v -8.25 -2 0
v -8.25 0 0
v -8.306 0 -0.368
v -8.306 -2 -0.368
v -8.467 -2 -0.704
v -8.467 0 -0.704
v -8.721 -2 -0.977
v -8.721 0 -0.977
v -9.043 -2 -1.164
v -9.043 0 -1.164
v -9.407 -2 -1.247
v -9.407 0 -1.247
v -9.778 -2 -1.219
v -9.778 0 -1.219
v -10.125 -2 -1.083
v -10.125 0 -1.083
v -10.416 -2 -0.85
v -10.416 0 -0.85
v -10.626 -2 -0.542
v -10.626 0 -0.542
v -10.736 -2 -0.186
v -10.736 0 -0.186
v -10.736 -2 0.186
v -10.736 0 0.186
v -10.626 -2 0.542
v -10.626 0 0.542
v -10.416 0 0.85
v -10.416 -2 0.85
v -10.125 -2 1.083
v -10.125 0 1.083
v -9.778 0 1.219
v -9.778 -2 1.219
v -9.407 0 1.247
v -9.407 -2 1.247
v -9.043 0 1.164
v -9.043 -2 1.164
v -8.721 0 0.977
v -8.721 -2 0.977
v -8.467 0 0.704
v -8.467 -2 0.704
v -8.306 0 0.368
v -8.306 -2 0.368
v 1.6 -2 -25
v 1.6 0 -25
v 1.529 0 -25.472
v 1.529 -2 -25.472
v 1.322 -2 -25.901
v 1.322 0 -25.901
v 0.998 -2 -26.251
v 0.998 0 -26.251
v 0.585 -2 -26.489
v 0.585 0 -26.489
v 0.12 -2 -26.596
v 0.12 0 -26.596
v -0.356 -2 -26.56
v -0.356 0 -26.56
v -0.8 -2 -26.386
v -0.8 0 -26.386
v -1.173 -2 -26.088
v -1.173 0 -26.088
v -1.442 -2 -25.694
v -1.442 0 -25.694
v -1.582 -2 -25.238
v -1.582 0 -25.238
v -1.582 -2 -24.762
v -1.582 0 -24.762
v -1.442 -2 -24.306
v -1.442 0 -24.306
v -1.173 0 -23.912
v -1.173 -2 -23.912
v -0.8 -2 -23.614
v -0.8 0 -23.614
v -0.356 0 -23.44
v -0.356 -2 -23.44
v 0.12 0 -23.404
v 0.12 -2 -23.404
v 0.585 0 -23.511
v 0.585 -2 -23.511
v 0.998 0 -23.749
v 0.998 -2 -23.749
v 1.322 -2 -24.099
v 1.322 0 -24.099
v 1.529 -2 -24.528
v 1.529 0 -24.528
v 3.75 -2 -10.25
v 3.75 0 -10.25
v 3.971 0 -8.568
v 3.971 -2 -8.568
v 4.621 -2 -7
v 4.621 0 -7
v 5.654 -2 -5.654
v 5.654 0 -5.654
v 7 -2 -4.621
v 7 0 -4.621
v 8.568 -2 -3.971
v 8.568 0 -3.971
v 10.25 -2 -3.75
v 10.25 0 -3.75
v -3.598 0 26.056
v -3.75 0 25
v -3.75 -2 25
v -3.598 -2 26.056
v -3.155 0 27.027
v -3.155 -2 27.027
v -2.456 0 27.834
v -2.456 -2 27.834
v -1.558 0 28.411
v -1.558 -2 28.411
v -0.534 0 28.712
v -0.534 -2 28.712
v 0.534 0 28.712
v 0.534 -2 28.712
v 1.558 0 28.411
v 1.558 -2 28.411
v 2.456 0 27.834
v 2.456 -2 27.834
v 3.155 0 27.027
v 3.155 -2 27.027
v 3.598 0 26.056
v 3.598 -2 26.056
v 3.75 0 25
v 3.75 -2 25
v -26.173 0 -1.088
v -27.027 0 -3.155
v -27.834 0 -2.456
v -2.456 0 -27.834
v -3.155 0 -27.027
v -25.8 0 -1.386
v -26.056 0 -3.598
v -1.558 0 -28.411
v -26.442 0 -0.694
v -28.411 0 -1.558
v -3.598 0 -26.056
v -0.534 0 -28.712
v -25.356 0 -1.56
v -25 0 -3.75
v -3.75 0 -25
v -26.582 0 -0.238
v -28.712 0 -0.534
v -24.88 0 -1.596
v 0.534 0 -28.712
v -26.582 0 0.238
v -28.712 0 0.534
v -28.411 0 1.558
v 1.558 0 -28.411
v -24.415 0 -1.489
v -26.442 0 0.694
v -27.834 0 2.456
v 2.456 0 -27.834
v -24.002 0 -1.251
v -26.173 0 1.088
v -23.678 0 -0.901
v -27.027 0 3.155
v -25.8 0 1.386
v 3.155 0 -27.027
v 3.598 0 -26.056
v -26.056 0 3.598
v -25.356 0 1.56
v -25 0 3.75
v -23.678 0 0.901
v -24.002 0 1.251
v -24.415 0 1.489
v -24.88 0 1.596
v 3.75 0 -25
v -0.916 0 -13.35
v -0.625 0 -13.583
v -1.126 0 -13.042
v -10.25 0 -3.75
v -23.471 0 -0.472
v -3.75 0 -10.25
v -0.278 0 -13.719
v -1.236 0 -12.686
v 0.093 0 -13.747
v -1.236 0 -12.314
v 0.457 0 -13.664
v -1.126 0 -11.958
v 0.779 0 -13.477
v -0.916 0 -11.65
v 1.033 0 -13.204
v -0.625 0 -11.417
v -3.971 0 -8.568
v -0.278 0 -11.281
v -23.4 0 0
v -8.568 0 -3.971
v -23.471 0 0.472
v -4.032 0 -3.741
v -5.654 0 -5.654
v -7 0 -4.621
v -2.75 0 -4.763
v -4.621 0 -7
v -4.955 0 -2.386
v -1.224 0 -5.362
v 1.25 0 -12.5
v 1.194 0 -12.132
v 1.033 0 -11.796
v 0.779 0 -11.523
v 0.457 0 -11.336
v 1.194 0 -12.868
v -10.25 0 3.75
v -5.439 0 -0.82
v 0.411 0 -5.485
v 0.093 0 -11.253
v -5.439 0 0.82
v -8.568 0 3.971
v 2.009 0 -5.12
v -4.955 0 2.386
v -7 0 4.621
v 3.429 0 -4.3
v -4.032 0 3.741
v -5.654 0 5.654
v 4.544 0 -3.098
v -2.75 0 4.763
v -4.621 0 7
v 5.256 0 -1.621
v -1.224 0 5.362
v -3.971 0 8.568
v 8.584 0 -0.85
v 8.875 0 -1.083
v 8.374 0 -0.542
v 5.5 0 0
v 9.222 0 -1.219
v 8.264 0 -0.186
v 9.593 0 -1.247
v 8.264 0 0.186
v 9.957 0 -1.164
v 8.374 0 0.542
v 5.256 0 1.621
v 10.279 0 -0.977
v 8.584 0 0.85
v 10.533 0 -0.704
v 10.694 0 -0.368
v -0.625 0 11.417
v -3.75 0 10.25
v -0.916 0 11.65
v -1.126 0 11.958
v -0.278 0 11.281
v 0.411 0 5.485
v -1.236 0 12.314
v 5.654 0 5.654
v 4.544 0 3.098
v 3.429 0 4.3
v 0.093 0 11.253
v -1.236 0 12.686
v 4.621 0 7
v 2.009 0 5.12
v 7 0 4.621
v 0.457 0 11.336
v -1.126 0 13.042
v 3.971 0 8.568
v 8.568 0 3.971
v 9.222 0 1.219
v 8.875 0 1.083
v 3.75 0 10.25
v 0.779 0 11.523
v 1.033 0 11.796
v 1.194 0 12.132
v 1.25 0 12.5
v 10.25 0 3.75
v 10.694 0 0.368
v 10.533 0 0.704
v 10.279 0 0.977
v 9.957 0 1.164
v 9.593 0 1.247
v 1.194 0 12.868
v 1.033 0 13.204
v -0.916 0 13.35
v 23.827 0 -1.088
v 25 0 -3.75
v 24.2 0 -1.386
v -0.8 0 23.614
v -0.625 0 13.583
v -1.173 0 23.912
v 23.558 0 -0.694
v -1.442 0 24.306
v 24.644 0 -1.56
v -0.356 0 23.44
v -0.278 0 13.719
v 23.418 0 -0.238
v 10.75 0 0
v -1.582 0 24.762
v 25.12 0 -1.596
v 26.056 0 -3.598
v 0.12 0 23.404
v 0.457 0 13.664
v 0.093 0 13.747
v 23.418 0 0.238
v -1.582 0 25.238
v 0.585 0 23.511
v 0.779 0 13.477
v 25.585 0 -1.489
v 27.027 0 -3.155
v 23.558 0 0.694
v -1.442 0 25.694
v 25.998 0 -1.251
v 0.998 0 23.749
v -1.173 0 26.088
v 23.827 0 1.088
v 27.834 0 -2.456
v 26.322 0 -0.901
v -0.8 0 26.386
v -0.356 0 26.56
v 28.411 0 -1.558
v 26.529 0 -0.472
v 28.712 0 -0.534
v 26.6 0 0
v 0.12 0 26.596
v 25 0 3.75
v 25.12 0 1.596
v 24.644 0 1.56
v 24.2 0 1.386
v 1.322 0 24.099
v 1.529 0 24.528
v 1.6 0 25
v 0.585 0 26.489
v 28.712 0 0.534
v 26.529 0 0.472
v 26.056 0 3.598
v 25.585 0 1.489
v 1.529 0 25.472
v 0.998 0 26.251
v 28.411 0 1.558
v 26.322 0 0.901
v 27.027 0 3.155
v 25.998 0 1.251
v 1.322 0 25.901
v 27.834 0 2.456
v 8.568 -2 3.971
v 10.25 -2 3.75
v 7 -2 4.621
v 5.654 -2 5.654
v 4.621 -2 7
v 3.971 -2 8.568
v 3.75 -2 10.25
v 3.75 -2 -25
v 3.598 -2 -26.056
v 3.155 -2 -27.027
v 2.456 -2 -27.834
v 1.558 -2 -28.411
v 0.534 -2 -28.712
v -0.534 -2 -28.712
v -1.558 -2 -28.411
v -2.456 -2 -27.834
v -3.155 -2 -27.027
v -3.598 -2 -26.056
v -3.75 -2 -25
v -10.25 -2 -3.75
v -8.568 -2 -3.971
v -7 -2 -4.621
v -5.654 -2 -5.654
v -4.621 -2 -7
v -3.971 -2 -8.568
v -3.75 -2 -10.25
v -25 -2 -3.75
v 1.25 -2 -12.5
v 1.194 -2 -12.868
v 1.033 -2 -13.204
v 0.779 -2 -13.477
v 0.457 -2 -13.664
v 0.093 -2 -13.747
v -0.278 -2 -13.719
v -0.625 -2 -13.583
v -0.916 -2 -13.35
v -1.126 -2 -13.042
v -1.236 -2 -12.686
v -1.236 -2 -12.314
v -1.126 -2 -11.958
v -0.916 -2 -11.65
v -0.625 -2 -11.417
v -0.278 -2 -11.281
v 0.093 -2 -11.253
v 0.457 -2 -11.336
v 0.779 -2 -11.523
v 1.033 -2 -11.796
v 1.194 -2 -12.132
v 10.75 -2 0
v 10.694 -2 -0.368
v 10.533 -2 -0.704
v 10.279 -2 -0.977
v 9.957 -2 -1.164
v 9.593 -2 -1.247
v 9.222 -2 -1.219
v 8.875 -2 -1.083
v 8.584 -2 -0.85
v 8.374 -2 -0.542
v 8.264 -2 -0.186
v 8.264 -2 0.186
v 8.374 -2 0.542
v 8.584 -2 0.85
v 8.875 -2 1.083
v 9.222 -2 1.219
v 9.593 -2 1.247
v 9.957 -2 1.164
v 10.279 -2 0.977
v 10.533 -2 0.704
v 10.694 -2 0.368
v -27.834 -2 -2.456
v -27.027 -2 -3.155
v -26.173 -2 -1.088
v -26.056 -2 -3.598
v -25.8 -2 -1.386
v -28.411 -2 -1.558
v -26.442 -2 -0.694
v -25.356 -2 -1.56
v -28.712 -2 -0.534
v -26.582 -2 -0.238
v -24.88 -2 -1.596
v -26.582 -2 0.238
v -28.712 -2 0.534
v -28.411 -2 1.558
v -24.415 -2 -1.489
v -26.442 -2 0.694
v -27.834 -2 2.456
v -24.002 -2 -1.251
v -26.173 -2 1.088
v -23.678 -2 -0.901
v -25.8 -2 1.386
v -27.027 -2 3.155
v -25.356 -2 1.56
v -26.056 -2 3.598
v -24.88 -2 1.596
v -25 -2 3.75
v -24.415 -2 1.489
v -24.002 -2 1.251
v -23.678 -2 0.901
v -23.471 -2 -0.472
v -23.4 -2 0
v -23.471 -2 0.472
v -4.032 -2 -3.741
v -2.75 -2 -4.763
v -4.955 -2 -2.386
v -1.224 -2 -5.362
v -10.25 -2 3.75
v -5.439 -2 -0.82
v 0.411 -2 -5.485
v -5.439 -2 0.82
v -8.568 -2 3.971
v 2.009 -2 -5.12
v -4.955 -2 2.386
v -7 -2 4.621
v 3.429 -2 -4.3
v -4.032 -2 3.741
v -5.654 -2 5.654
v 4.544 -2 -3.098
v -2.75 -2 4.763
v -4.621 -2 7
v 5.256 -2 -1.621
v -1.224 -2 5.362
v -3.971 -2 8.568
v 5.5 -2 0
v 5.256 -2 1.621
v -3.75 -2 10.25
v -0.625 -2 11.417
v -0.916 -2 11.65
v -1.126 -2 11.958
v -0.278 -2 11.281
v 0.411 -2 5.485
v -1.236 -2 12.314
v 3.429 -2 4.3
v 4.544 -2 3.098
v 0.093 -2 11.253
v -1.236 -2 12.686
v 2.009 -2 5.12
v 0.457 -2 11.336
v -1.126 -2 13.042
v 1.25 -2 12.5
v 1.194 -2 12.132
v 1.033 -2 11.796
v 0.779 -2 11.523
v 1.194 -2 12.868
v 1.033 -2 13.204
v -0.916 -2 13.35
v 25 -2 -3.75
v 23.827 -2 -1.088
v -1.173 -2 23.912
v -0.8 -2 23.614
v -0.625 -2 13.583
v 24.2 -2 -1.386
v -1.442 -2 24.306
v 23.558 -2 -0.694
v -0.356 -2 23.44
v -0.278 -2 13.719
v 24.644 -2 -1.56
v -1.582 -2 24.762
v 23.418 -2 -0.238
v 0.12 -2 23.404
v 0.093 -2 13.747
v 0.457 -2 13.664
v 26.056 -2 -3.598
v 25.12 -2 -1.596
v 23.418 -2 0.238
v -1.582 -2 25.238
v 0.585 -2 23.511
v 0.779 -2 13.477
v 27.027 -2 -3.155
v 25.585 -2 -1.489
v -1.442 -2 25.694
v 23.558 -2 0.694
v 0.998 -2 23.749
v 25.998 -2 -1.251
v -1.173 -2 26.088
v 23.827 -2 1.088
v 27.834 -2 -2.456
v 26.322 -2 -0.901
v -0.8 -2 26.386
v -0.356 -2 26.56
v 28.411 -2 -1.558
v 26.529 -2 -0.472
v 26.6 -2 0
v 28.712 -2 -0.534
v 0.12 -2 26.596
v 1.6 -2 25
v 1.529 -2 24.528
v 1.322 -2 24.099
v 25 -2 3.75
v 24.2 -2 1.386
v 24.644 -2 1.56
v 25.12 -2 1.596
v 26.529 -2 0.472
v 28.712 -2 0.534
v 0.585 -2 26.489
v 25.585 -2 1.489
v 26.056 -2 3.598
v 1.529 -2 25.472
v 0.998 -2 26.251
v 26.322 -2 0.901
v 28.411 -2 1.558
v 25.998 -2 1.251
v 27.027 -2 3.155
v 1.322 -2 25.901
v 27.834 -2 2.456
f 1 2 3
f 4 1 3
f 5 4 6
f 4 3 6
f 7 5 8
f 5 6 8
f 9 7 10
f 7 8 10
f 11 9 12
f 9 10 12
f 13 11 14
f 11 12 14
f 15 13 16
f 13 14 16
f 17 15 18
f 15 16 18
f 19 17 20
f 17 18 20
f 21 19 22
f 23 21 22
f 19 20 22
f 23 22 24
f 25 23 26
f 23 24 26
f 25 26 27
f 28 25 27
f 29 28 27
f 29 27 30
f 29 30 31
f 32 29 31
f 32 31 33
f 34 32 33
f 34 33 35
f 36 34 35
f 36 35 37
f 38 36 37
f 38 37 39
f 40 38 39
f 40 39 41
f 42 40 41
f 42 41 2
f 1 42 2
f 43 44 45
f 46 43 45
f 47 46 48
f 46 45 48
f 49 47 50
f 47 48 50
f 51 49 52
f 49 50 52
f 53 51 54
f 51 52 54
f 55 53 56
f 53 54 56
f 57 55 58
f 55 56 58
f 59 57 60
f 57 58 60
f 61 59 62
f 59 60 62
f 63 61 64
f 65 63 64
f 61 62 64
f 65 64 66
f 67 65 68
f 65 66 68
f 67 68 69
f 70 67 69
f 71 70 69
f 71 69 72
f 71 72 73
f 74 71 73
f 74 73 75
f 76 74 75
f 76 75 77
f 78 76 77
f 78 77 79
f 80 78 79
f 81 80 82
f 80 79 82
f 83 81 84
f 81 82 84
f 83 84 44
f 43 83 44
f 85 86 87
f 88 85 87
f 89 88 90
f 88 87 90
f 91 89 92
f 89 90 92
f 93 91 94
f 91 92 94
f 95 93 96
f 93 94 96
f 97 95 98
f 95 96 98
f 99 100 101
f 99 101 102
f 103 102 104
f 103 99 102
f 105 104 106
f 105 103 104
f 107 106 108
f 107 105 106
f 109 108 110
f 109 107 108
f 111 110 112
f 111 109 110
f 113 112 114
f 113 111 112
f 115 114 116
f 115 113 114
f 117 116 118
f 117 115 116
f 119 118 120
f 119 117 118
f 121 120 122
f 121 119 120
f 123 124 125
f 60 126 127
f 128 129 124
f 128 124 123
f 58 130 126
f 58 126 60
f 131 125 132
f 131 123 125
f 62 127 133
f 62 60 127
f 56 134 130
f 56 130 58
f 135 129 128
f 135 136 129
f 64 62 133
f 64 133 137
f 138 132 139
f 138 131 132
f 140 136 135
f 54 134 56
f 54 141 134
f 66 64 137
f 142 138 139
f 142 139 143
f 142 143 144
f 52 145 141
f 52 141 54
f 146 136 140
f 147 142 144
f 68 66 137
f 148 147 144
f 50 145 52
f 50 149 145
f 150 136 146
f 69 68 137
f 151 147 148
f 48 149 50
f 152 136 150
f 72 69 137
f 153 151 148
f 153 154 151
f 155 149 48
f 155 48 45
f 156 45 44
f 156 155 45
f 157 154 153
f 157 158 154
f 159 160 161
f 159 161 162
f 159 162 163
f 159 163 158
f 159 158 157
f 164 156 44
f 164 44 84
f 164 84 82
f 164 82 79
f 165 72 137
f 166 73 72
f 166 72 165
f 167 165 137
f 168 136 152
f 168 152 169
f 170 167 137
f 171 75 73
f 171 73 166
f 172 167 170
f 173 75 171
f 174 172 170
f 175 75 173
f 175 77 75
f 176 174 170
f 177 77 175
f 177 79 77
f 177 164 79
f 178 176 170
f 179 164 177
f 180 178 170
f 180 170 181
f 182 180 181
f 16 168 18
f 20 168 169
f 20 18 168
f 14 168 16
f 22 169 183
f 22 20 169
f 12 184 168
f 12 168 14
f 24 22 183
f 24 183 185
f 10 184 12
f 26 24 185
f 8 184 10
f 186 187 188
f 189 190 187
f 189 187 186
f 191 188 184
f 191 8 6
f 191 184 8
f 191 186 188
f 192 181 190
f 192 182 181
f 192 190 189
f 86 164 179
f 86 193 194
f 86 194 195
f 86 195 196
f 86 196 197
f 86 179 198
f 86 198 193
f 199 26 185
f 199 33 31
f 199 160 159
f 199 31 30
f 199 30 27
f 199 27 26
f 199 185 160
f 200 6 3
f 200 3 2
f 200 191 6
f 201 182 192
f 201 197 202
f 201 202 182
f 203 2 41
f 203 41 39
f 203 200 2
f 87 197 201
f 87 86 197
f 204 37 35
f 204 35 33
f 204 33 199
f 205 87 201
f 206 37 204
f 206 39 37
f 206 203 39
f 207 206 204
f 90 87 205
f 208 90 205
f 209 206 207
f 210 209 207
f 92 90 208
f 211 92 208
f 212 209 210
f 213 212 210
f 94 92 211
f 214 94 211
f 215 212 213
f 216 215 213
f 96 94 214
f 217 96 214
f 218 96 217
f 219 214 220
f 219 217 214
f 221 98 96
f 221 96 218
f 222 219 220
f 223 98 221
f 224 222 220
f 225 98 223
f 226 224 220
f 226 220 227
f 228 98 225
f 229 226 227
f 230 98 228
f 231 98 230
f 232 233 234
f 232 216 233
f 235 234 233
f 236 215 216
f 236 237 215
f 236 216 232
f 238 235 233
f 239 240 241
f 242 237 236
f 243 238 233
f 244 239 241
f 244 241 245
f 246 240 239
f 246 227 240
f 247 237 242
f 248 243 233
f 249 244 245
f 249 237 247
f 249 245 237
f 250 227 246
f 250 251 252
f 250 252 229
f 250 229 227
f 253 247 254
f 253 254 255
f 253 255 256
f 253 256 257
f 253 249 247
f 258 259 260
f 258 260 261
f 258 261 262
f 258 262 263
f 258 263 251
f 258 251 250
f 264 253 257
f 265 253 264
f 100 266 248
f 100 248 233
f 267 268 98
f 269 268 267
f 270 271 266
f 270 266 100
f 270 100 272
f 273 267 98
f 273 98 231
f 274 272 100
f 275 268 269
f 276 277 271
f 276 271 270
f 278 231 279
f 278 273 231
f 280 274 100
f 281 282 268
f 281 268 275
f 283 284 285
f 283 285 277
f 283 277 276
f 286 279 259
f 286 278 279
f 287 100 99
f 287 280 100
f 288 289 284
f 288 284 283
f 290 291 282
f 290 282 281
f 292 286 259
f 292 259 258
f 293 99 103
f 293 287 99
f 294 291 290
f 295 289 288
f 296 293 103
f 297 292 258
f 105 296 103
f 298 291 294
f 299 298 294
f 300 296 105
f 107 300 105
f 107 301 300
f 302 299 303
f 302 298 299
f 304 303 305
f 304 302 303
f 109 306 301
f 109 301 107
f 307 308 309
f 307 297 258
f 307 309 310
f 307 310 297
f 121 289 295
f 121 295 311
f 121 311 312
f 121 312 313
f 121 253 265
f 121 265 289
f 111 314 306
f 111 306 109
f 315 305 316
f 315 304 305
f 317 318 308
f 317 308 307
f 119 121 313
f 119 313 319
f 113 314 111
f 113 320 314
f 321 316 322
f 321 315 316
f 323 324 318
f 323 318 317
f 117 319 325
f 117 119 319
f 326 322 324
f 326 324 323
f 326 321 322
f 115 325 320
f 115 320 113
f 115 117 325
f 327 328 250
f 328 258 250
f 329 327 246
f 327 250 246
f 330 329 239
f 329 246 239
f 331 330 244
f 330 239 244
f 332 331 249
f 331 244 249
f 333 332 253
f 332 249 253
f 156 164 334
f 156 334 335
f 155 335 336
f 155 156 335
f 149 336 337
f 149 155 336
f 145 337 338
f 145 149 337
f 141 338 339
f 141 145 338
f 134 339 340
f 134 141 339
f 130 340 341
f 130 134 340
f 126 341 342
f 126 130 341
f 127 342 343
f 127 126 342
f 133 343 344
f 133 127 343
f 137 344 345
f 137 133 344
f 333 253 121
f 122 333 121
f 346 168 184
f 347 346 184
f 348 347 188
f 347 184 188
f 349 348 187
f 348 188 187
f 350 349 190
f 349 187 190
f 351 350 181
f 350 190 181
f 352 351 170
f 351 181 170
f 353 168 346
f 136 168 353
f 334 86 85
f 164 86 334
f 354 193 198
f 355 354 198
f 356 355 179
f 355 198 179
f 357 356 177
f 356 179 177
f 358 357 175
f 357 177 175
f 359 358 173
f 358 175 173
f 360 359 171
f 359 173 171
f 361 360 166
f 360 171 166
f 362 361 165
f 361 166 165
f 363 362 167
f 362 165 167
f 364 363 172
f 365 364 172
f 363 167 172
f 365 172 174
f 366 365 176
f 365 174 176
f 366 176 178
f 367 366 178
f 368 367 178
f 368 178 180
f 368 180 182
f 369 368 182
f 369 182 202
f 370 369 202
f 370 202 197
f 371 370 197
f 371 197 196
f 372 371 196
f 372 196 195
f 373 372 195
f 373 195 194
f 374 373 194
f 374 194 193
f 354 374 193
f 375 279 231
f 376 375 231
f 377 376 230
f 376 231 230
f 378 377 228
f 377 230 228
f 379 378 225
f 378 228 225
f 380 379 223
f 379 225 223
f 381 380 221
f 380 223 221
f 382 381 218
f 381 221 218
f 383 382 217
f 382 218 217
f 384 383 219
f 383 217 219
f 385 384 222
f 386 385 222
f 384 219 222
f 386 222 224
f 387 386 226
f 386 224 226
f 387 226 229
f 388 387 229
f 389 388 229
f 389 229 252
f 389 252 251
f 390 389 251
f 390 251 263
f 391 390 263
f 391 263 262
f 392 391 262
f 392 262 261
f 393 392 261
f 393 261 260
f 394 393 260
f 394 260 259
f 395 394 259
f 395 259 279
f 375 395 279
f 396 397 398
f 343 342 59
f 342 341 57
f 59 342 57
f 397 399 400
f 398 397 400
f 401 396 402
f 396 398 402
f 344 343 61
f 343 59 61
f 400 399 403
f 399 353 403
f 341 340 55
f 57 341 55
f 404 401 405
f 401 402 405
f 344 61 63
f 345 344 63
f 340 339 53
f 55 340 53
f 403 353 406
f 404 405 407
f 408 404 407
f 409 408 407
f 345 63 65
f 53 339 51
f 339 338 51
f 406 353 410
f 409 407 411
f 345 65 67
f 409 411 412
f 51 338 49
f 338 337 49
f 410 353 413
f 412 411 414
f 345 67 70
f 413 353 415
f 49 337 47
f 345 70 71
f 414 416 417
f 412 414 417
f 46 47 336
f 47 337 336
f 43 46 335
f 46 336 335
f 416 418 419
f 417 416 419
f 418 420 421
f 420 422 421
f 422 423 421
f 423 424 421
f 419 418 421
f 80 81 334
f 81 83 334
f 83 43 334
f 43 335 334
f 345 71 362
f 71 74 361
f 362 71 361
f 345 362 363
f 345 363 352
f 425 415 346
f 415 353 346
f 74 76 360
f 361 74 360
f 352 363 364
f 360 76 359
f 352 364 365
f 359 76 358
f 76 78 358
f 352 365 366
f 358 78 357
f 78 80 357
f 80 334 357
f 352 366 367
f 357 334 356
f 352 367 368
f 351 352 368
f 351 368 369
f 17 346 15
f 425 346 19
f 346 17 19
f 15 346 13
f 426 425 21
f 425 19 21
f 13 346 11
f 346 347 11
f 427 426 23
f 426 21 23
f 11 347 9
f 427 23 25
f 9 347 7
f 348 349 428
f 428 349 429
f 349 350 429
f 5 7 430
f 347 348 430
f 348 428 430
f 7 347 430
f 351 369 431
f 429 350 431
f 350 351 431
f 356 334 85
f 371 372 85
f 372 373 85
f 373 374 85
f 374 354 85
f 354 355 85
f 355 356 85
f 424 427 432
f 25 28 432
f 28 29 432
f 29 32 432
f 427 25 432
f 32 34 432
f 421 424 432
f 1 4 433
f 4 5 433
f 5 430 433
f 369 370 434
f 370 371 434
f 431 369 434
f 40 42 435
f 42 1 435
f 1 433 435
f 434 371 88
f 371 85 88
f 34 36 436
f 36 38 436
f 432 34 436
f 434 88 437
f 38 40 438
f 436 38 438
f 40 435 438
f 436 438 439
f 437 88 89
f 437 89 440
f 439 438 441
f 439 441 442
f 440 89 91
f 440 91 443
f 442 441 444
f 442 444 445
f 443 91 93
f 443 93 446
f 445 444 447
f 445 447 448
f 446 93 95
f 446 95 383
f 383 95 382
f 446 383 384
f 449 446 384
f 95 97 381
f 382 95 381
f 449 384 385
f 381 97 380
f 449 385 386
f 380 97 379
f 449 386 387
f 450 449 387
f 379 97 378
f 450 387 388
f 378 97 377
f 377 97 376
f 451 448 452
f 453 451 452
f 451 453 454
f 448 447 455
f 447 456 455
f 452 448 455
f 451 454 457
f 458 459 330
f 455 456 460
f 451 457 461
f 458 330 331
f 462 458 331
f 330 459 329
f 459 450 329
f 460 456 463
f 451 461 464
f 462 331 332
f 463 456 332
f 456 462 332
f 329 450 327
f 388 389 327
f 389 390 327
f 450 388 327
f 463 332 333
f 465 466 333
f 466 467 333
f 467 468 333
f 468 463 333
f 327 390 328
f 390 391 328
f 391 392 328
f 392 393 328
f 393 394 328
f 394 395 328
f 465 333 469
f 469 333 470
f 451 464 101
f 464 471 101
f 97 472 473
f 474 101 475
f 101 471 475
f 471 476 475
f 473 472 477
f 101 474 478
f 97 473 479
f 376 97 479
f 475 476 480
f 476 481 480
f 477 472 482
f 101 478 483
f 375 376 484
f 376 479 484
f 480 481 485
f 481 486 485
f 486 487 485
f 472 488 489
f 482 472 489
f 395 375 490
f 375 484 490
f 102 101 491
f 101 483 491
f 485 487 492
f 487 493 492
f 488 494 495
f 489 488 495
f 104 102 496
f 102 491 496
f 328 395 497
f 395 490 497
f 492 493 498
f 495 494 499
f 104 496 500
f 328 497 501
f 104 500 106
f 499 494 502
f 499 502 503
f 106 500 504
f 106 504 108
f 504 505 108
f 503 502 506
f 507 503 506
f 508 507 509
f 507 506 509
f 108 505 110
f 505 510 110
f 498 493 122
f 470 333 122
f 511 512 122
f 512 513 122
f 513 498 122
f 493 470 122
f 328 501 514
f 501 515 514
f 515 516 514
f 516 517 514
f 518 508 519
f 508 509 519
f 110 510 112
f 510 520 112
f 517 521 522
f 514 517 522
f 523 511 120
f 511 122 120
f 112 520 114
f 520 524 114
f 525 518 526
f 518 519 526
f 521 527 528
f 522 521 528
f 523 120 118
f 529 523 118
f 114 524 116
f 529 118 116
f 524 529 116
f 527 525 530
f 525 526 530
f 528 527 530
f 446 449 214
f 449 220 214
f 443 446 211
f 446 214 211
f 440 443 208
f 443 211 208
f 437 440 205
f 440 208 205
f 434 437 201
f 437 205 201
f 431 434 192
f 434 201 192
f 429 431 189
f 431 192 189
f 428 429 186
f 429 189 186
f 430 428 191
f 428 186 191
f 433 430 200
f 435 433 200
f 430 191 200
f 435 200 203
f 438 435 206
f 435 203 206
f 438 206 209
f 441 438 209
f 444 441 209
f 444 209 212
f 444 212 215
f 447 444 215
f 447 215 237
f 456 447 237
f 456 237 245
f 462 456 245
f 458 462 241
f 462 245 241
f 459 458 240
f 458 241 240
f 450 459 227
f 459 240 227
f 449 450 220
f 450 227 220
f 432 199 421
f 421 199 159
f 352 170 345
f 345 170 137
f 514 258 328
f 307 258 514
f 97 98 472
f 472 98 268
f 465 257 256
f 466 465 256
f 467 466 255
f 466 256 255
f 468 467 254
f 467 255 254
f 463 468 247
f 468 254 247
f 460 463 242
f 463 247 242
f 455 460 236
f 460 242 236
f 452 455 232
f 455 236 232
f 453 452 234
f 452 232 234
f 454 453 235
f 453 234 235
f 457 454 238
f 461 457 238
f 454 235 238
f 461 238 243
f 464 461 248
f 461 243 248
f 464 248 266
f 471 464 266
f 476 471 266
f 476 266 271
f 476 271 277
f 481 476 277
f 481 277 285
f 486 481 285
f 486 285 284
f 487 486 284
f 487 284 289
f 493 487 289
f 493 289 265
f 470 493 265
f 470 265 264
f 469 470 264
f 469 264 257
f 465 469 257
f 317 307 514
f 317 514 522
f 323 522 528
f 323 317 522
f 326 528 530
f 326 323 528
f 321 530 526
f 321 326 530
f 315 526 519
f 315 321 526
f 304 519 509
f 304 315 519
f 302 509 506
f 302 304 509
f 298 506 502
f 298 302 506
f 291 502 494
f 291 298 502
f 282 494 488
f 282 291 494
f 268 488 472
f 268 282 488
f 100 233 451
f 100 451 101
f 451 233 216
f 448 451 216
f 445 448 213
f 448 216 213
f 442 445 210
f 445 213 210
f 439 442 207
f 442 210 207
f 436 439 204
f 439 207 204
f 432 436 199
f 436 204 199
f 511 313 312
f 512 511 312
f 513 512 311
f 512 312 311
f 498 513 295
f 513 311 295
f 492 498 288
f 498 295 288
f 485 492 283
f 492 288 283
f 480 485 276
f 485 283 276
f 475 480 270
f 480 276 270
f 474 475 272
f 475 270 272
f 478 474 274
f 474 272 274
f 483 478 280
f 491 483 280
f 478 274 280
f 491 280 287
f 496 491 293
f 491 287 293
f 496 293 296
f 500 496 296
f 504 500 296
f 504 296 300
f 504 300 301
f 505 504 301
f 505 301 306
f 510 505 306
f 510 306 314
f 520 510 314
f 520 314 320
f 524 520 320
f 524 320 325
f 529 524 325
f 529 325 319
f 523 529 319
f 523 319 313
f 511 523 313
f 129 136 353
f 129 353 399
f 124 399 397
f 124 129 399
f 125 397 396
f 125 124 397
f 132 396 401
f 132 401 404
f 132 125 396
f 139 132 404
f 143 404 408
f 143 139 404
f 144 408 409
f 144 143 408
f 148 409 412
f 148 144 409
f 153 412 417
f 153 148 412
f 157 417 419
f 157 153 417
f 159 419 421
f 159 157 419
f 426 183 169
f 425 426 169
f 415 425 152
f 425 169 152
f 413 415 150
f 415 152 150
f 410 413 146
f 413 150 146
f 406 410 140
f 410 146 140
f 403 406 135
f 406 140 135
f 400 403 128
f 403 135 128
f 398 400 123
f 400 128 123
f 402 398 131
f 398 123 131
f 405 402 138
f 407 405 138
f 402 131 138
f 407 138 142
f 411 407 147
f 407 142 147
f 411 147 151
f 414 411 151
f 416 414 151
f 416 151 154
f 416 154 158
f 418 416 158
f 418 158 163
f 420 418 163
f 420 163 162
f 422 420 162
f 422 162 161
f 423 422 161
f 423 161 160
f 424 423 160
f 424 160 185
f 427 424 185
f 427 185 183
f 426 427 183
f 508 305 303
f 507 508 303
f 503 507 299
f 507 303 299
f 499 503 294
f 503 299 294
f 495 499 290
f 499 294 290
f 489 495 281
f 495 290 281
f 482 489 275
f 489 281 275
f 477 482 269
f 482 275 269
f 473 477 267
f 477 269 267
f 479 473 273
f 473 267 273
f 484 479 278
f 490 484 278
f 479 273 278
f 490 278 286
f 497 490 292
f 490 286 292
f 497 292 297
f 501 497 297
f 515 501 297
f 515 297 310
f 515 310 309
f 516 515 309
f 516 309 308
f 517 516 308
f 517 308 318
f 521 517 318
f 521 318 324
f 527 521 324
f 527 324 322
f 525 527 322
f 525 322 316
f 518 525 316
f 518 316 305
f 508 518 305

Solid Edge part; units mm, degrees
sketch "Sketch1" plane through (0, 0, 0) normal (0, -1, 0) x (1, 0, 0)
  line L0 (-3.75, 18.75) -> (-3.75, 25)
  arc A0 (-3.75, 25) -> (3.75, 25) centre (0, 25) cw
  line L1 (3.75, 18.75) -> (3.75, 25)
  line L2 (3.75, 10.25) -> (3.75, 18.75)
  arc A1 (3.75, 10.25) -> (10.25, 3.75) centre (10.25, 10.25) ccw
  line L3 (10.25, 3.75) -> (25, 3.75)
  arc A2 (25, 3.75) -> (25, -3.75) centre (25, 0) cw
  line L4 (10.25, -3.75) -> (25, -3.75)
  arc A3 (10.25, -3.75) -> (3.75, -10.25) centre (10.25, -10.25) ccw
  line L5 (3.75, -10.25) -> (3.75, -25)
  arc A4 (3.75, -25) -> (-3.75, -25) centre (0, -25) cw
  line L6 (-3.75, -10.25) -> (-3.75, -25)
  arc A5 (-10.25, -3.75) -> (-3.75, -10.25) centre (-10.25, -10.25) cw
  line L7 (-10.25, -3.75) -> (-25, -3.75)
  arc A6 (-25, -3.75) -> (-25, 3.75) centre (-25, 0) cw
  line L8 (-10.25, 3.75) -> (-25, 3.75)
  arc A7 (-10.25, 3.75) -> (-3.75, 10.25) centre (-10.25, 10.25) ccw
  line L9 (-3.75, 10.25) -> (-3.75, 18.75)
extrude "Protrusion1" add sketch "Sketch1" along normal up to vertex (2 mm away)
sketch "Sketch2" plane through (0, 0, 0) normal (0, -1, 0) x (1, 0, 0)
  circle A0 centre (0, 25) radius 1.6
  circle A1 centre (9.5, 0) radius 1.25
  circle A2 centre (25, 0) radius 1.6
  circle A3 centre (0, 12.5) radius 1.25
  circle A4 centre (-9.5, 0) radius 1.25
  circle A5 centre (-25, 0) radius 1.6
  circle A6 centre (0, -12.5) radius 1.25
  circle A7 centre (0, -25) radius 1.6
  circle A8 centre (0, 0) radius 5.5
  dimension "D1" = 40
  dimension "D2" = 40
  dimension "D3" = 40
  dimension "D4" = 40
  dimension "D5" = 35.3553
  dimension "D6" = 3.2
  dimension "D7" = 3.2
  dimension "D8" = 3.2
  dimension "D9" = 3.2
  dimension "D10" = 3.75
  dimension "D11" = 3.75
  dimension "D12" = 3.75
  dimension "D13" = 3.75
  dimension "D14" = 2.5
  dimension "D15" = 2.5
  dimension "D16" = 2.5
extrude "Cutout1" cut sketch "Sketch2" along normal up to next
properties material "Aluminum, 1060"
